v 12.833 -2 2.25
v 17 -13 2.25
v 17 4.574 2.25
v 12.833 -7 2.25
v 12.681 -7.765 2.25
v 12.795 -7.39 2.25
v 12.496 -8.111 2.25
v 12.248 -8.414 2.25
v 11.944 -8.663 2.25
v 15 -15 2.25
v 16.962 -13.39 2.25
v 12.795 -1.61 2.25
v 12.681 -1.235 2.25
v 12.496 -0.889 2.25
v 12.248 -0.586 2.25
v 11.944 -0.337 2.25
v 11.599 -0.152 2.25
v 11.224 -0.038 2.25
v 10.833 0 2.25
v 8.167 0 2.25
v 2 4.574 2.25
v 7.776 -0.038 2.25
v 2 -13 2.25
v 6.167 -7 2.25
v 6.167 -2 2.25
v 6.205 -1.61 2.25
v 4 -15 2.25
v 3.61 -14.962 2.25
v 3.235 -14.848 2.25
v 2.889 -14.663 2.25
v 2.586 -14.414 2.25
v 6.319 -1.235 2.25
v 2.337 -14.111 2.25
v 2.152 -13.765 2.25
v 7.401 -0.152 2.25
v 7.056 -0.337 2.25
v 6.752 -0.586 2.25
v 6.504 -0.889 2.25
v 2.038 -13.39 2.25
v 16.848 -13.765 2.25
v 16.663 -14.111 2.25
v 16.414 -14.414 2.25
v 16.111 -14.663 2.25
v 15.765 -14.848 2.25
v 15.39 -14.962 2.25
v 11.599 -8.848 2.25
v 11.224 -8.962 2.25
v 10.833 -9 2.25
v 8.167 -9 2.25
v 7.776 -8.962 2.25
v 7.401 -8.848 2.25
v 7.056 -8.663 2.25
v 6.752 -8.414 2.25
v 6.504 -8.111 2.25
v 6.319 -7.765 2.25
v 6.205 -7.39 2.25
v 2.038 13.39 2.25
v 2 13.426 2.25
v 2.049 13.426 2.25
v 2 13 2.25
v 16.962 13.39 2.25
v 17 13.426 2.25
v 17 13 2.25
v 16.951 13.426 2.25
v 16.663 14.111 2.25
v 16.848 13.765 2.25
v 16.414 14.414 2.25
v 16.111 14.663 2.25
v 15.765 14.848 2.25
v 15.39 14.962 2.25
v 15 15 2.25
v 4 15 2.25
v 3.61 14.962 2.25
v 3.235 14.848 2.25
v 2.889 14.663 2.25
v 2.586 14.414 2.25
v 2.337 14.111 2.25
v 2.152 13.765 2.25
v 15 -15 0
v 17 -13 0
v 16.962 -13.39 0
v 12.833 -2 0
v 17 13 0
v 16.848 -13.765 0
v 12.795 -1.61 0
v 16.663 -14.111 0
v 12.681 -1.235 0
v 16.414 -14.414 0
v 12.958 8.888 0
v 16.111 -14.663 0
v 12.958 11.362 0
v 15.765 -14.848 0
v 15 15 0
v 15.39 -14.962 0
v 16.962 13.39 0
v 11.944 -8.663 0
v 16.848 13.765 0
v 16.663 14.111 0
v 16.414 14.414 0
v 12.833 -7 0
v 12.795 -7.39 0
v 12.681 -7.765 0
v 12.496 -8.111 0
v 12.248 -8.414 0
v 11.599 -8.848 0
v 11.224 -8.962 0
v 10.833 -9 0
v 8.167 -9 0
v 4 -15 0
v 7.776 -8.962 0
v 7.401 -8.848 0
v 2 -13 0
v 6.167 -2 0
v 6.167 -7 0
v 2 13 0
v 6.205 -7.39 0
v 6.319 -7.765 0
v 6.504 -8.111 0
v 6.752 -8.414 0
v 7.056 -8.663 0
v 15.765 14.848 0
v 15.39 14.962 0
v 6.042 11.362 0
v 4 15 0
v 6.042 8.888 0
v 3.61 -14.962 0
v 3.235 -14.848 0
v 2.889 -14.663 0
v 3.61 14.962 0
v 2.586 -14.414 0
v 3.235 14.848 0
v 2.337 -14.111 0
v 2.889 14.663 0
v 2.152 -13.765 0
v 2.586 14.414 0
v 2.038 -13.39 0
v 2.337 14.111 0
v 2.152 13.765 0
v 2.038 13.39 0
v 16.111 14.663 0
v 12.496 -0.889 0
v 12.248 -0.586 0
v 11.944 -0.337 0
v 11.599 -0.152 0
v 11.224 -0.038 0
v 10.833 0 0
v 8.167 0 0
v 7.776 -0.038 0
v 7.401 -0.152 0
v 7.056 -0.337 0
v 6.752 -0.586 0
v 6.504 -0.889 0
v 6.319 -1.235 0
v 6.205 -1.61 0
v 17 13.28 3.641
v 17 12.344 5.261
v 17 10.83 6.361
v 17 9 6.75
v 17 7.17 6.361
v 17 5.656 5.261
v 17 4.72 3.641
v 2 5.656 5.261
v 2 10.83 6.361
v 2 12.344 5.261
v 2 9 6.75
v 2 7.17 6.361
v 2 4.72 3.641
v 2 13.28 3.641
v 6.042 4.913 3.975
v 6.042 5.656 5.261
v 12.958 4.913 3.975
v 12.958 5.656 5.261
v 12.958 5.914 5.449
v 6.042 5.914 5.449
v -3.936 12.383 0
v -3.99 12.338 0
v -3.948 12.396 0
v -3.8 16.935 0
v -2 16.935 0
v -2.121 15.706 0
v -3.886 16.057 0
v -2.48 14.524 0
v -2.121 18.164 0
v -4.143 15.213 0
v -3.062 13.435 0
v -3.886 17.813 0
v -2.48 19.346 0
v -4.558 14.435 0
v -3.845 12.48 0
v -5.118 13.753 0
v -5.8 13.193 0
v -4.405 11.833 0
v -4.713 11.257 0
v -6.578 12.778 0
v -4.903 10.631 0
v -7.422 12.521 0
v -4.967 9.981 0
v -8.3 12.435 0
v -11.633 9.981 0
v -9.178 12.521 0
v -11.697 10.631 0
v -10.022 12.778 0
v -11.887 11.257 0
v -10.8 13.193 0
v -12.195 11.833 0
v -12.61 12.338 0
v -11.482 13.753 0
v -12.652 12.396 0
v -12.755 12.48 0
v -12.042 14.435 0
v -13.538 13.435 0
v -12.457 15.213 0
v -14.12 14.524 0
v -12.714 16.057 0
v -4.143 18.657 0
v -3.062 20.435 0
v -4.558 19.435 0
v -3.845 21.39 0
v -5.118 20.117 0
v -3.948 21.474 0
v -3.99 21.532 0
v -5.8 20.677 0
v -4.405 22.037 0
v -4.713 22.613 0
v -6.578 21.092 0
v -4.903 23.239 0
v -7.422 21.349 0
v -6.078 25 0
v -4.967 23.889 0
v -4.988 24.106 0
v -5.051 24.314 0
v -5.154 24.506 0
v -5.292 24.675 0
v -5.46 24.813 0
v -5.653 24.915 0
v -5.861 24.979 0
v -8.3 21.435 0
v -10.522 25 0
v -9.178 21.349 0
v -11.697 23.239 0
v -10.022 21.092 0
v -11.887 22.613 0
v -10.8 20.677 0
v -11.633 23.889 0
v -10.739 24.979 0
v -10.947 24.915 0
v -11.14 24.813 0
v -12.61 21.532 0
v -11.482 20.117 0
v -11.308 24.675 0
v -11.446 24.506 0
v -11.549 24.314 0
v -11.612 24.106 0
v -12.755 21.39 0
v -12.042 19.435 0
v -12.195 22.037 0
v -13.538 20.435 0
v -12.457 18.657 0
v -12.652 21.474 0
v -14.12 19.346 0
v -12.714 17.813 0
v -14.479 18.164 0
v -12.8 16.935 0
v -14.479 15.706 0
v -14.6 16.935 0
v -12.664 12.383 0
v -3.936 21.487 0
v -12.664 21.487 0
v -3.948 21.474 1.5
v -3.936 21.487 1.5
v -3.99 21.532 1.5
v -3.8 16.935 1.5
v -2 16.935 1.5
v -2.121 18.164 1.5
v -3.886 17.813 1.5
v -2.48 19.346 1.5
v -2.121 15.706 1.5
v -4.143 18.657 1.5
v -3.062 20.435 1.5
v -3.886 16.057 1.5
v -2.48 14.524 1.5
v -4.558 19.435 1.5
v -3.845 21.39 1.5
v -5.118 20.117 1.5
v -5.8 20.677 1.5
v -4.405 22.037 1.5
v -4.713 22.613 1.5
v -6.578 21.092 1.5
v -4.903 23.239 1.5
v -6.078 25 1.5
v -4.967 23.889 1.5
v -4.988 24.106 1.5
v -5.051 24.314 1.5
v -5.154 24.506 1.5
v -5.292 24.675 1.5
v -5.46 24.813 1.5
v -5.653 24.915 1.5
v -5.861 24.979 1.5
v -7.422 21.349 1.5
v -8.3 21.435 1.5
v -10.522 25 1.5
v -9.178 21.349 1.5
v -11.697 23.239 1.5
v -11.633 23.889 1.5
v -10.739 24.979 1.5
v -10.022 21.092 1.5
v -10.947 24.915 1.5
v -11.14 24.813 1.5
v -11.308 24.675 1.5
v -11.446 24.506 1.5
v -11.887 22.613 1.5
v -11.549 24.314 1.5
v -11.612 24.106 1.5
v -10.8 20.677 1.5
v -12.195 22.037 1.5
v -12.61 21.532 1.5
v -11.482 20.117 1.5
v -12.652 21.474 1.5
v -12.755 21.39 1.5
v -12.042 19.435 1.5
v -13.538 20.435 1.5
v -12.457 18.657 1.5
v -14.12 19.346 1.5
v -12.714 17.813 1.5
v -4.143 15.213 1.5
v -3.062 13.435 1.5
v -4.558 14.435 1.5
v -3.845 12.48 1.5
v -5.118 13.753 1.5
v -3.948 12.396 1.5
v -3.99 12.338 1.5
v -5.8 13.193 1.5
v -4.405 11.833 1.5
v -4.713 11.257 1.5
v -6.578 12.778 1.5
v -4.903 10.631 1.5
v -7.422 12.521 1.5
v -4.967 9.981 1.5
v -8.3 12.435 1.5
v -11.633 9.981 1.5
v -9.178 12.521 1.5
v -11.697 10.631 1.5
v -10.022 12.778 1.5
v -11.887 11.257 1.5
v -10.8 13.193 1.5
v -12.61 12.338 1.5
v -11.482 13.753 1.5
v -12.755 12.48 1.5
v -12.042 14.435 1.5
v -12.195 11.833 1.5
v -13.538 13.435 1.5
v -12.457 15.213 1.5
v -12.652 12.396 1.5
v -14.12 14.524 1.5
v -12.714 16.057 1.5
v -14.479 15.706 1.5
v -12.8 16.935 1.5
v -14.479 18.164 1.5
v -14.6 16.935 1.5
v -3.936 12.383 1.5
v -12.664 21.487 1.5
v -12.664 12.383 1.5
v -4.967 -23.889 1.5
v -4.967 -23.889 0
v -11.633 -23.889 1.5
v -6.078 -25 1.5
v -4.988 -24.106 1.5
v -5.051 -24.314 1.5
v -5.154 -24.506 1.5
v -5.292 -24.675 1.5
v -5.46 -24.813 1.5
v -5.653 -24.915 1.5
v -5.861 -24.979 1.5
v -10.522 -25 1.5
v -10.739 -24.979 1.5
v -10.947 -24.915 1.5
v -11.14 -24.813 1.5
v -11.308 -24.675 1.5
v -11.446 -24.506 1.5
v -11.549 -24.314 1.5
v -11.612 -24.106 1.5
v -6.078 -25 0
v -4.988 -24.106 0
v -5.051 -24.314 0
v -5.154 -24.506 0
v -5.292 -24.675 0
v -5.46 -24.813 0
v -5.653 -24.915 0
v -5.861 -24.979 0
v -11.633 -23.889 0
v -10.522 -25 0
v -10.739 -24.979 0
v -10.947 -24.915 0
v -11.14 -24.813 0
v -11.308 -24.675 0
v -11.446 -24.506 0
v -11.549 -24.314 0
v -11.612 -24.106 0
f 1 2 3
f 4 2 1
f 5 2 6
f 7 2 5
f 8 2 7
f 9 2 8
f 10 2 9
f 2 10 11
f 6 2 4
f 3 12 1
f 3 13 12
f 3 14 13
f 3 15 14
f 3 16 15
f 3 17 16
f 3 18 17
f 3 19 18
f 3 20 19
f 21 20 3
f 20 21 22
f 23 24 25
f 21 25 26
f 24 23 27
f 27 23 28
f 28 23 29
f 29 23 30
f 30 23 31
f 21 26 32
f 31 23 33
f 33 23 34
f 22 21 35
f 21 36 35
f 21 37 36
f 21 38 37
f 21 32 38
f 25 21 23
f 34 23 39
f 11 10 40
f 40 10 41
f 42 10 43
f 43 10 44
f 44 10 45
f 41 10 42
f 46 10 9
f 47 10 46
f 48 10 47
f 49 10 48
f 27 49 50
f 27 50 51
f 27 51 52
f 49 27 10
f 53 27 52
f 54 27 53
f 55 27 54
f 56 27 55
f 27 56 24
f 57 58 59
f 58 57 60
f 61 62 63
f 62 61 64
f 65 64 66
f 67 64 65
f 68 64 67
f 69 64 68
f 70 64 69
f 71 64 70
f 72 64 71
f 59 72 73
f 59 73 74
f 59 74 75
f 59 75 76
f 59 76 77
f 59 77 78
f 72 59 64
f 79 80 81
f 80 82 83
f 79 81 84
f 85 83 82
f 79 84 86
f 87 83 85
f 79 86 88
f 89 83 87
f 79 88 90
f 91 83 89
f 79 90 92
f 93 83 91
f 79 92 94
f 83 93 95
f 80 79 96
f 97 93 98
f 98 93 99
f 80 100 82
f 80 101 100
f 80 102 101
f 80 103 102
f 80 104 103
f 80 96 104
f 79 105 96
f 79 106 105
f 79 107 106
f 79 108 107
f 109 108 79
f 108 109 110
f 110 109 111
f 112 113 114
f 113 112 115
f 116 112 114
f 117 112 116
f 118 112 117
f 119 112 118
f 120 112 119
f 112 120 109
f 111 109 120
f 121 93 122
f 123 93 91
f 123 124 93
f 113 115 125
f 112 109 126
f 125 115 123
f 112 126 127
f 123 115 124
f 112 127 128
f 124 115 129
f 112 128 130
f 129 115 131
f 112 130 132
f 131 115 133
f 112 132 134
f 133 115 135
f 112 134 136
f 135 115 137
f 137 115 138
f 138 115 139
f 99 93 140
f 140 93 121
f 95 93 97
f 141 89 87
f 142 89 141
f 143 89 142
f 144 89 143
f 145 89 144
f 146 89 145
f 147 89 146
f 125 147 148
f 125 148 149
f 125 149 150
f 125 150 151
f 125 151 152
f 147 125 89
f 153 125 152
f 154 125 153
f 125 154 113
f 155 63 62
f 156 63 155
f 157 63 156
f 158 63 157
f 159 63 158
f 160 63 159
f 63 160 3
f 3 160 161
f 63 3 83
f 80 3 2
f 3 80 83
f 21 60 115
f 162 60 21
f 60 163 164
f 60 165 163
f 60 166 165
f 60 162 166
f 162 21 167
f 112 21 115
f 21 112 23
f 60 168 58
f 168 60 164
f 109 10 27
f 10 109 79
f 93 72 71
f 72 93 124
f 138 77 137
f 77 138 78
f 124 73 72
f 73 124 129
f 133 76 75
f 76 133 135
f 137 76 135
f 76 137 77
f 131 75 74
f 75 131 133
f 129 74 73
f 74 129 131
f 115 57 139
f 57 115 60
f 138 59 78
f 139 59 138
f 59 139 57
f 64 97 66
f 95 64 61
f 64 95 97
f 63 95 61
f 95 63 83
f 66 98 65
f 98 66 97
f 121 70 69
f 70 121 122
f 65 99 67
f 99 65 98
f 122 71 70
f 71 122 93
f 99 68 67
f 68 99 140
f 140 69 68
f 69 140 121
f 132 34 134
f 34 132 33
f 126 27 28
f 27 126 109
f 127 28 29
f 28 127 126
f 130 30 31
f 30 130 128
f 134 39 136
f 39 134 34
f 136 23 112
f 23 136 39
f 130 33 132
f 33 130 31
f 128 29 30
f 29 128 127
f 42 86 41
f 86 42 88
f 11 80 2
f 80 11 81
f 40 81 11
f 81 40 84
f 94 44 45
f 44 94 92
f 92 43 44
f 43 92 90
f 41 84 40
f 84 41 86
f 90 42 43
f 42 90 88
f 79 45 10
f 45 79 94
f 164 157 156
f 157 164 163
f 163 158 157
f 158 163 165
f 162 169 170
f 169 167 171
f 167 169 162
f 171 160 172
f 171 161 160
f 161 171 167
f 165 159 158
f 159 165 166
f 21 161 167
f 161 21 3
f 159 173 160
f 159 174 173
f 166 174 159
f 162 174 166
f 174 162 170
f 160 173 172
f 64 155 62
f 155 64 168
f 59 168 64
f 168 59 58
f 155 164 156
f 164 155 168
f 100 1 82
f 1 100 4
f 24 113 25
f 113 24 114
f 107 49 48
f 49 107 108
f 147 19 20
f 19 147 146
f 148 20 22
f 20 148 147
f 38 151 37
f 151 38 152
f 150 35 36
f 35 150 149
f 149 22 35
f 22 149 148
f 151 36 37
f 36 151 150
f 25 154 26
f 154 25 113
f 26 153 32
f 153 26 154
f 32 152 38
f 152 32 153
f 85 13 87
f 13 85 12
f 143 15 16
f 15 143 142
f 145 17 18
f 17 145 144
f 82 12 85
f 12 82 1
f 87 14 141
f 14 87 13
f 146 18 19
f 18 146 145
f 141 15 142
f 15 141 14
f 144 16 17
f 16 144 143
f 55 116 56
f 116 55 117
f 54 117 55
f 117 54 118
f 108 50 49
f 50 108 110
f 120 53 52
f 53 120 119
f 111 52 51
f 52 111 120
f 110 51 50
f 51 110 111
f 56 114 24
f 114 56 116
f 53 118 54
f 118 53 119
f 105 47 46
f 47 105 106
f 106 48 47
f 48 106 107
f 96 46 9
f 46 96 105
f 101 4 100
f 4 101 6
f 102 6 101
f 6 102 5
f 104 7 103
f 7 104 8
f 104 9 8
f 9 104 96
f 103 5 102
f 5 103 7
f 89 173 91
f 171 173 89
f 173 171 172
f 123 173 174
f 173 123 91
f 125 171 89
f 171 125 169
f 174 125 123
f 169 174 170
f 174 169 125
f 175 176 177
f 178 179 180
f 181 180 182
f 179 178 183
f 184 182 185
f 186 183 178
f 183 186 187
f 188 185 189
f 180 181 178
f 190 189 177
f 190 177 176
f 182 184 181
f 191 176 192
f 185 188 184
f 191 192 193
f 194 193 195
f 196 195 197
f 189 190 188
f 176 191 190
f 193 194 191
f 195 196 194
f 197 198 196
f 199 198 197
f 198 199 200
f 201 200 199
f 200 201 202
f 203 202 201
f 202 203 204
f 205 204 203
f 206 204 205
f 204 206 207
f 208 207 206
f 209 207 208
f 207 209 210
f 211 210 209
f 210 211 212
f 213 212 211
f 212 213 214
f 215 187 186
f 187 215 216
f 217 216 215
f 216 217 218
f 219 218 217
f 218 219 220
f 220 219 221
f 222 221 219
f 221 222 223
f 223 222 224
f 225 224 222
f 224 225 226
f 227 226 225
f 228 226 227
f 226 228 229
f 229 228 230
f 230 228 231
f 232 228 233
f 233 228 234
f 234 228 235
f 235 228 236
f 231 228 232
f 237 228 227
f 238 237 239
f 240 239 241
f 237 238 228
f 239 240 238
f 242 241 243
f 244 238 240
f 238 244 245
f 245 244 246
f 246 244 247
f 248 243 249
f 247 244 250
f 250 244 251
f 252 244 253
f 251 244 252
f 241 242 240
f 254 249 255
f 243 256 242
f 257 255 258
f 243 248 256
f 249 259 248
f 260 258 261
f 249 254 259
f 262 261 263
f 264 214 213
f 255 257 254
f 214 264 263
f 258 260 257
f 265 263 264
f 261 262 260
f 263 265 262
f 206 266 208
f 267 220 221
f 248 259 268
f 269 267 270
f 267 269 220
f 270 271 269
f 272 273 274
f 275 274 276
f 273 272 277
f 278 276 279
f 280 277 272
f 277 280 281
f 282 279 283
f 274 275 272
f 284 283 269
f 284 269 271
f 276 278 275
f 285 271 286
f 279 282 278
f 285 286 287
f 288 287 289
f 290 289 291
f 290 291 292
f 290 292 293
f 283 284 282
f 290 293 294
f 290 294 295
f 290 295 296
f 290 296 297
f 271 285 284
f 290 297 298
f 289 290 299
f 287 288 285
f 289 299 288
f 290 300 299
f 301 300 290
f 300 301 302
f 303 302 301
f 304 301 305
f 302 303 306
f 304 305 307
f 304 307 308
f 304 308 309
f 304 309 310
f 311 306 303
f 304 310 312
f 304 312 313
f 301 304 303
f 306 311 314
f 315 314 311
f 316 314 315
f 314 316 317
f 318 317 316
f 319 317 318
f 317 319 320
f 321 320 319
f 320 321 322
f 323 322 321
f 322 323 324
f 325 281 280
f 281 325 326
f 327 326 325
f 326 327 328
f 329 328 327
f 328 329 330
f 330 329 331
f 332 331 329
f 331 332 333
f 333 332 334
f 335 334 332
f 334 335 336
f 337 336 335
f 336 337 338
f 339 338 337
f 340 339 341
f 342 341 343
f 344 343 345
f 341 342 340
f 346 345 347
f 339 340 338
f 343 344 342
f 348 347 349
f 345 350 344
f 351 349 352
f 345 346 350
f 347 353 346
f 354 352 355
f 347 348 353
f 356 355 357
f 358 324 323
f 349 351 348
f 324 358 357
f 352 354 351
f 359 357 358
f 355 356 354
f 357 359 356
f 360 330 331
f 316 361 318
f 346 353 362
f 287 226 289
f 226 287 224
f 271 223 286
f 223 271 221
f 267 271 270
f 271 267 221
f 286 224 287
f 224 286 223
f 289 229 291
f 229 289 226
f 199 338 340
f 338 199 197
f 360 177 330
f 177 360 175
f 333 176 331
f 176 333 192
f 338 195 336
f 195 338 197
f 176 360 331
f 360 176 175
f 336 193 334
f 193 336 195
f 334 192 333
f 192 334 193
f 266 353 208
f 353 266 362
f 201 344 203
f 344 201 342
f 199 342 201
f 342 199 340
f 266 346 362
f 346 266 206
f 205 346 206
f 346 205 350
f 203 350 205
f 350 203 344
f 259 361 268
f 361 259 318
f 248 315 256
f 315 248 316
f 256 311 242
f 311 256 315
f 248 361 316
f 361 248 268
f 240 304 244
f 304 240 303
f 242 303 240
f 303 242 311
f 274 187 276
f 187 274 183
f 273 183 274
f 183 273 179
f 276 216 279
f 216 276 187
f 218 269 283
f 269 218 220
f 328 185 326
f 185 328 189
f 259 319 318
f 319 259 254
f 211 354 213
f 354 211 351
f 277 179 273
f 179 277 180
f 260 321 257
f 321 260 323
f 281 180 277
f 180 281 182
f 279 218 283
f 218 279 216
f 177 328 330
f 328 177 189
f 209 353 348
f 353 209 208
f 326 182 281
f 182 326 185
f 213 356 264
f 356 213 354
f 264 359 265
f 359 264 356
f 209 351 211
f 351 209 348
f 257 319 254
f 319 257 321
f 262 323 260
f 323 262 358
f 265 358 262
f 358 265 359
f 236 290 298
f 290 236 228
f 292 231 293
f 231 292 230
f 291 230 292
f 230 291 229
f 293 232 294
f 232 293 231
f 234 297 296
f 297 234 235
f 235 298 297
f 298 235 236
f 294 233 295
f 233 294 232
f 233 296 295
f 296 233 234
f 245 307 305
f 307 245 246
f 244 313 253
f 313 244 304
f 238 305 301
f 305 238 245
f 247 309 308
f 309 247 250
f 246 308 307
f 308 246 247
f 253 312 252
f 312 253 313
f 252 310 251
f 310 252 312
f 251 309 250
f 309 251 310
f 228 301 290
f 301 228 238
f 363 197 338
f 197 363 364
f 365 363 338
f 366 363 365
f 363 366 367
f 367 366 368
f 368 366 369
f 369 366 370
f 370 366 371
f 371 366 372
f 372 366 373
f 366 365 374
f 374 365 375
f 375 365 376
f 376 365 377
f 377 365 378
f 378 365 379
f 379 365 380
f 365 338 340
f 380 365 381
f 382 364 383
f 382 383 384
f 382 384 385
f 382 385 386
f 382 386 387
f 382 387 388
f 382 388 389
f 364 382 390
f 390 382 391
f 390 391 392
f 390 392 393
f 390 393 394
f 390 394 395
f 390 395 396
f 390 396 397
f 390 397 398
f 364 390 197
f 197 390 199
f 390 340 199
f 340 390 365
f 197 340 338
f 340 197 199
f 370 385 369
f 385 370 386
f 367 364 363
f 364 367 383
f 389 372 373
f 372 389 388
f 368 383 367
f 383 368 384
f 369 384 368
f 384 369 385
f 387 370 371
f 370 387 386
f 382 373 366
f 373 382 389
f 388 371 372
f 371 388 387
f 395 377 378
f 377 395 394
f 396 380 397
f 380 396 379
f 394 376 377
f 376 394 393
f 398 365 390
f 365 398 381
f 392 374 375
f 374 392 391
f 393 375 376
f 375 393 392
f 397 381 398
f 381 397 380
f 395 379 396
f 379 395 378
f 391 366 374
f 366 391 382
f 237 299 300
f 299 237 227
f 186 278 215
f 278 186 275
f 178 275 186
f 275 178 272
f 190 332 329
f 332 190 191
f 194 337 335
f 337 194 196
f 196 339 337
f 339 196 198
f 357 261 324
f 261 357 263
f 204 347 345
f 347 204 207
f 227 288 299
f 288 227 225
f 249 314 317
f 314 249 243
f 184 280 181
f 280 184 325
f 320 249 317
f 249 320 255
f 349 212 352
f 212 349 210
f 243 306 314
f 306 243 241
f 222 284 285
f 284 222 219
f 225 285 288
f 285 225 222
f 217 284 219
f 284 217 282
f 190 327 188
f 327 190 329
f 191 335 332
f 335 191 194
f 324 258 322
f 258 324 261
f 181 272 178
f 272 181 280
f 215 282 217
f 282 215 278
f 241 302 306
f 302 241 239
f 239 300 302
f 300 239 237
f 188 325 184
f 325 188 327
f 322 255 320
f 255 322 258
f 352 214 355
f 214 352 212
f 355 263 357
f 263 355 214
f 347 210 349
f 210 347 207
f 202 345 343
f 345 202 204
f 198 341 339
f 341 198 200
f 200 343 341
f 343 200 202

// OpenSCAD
//------------------------------------------------------------
//	Catapult v2
//
//	(Floating Widget Catapult
//	when projectile_diameter = 30;)
//
//	http://thingiverse.com/Benjamin
//   http://www.thingiverse.com/thing:11910
//------------------------------------------------------------



projectile_diameter = 10;

catapult_length = 50;
catapult_thickness = 1.5;
arm_angle = 45;
play = 0.25;

buildBase = true;
buildArm = true;

//--------------------------------------------
margin = 2;
cw = 2 * projectile_diameter/3; // catapult width
ct = catapult_thickness;
rs = projectile_diameter/3;     // roundness radius
br = rs/3;                      // box roundness
fnrs = 32;
hr = (projectile_diameter-1)/2; // inner hole radius
er = 1.4 * hr;                  // outer hole radius
hw = cw/2;
xs = rs + cw/2;
ys = sqrt((er+rs)*(er+rs)-(hw+rs)*(hw+rs));
lb = catapult_length - 2 * ys - br;

//-------------------- BASE -------------------
base_w = max (15, cw * 1.4);
base_h = catapult_length*0.6;
base_t = ct*1.5;
baseOffW = (buildArm ? base_w/2 + margin : 0);
if (buildBase) {
	translate ([baseOffW, 0, base_t/2])
	difference() {
		union () {
			roundBox(base_w, base_h, base_t, 2);
			// demi-cylindre
			translate ([0, base_h*0.3 , base_t/2])
			rotate (90, [0, -1, 0])
			difference() {
				cylinder(r = base_t*2, h = base_w, center = true);
				translate([-base_t*2, 0, 0])
				cube([base_t*4, base_t*4, base_w*1.5], center=true);
			}

		}
		translate([0, -base_h*0.15, 0])
		roundBox(cw, base_h*0.3, base_t*2, 2);

		translate ([0, base_h*0.3, 0])
		rotate(-arm_angle, [1, 0, 0])
		cube([cw+play,catapult_length, ct+play], center=true );
	}
}


//-------------------- ARM --------------------
offW = (buildBase ? -er - margin: 0);
if (buildArm) {
translate([offW, catapult_length/2 -ys -br, ct/2])

difference() {
	union () {
		cylinder (r=er, h = ct, center=true, $fn=fnrs);
		roundedLink(xs, ys, rs, ct);
		roundedLink(xs, -ys, rs, ct);
		roundedLink(-xs, -ys, rs, ct);
		roundedLink(-xs, ys, rs, ct);

		translate ([xs-rs-br, ys, 0])
		cylinder (r=br, h=ct, center=true, $fn=fnrs);
		translate ([-xs+rs+br, ys, 0])
		cylinder (r=br, h=ct, center=true, $fn=fnrs);
		translate([0, ys, 0])
		cube([2*(xs-rs-br), 2*br, ct], center=true);

		translate([0, -(ys+lb/2-br/2), 0])
		cube([cw, lb - br, ct], center=true);

		translate([cw/2-br, -(ys+lb-br), 0])
		cylinder (r=br, h=ct, center=true, $fn=fnrs);

		translate([-cw/2+br, -(ys+lb-br), 0])
		cylinder (r=br, h=ct, center=true, $fn=fnrs);

		translate([0, -(ys+lb-br), 0])
		cube([2*(xs-rs-br), 2*br, ct], center=true);
		
	}
	cylinder (r=hr, h = ct*1.2, center=true, $fn=fnrs);
}
}
//---------------------------------------------



//---------------------------------------------
module roundedLink(xr, yr, rc, rt) {
	difference () {
		linear_extrude(height=rt, center=true)
		polygon(points=[[0,0],[xr,yr],[0,yr]], paths=[[0,1,2]]);
		translate ([xr, yr, 0])
		cylinder (r=rc, h=rt*1.2, center=true, $fn=fnrs);
	}
}
//---------------------------------------------
module roundBox(bw, bh, bt, rb) {
	union () {
		cube([(bw-2*rb)*1.05, (bh-2*rb)*1.05, bt], center=true);
		translate ([(bw-rb)/2, 0, 0])
		cube([rb, bh-2*rb, bt], center=true);
		translate ([-(bw-rb)/2, 0, 0])
		cube([rb, bh-2*rb, bt], center=true);
		translate ([0, -(bh-rb)/2, 0])
		cube([bw-2*rb, rb, bt], center=true);
		translate ([0, (bh-rb)/2, 0])
		cube([bw-2*rb, rb, bt], center=true);
		translate ([(-bw+2*rb)/2, (bh-2*rb)/2, 0])
		cylinder (r=rb, h = bt, center=true, $fn=fnrs);
		translate ([(bw-2*rb)/2, (bh-2*rb)/2, 0])
		cylinder (r=rb, h = bt, center=true, $fn=fnrs);
		translate ([(-bw+2*rb)/2, (-bh+2*rb)/2, 0])
		cylinder (r=rb, h = bt, center=true, $fn=fnrs);
		translate ([(bw-2*rb)/2, (-bh+2*rb)/2, 0])
		cylinder (r=rb, h = bt, center=true, $fn=fnrs);
	}
}
//---------------------------------------------
